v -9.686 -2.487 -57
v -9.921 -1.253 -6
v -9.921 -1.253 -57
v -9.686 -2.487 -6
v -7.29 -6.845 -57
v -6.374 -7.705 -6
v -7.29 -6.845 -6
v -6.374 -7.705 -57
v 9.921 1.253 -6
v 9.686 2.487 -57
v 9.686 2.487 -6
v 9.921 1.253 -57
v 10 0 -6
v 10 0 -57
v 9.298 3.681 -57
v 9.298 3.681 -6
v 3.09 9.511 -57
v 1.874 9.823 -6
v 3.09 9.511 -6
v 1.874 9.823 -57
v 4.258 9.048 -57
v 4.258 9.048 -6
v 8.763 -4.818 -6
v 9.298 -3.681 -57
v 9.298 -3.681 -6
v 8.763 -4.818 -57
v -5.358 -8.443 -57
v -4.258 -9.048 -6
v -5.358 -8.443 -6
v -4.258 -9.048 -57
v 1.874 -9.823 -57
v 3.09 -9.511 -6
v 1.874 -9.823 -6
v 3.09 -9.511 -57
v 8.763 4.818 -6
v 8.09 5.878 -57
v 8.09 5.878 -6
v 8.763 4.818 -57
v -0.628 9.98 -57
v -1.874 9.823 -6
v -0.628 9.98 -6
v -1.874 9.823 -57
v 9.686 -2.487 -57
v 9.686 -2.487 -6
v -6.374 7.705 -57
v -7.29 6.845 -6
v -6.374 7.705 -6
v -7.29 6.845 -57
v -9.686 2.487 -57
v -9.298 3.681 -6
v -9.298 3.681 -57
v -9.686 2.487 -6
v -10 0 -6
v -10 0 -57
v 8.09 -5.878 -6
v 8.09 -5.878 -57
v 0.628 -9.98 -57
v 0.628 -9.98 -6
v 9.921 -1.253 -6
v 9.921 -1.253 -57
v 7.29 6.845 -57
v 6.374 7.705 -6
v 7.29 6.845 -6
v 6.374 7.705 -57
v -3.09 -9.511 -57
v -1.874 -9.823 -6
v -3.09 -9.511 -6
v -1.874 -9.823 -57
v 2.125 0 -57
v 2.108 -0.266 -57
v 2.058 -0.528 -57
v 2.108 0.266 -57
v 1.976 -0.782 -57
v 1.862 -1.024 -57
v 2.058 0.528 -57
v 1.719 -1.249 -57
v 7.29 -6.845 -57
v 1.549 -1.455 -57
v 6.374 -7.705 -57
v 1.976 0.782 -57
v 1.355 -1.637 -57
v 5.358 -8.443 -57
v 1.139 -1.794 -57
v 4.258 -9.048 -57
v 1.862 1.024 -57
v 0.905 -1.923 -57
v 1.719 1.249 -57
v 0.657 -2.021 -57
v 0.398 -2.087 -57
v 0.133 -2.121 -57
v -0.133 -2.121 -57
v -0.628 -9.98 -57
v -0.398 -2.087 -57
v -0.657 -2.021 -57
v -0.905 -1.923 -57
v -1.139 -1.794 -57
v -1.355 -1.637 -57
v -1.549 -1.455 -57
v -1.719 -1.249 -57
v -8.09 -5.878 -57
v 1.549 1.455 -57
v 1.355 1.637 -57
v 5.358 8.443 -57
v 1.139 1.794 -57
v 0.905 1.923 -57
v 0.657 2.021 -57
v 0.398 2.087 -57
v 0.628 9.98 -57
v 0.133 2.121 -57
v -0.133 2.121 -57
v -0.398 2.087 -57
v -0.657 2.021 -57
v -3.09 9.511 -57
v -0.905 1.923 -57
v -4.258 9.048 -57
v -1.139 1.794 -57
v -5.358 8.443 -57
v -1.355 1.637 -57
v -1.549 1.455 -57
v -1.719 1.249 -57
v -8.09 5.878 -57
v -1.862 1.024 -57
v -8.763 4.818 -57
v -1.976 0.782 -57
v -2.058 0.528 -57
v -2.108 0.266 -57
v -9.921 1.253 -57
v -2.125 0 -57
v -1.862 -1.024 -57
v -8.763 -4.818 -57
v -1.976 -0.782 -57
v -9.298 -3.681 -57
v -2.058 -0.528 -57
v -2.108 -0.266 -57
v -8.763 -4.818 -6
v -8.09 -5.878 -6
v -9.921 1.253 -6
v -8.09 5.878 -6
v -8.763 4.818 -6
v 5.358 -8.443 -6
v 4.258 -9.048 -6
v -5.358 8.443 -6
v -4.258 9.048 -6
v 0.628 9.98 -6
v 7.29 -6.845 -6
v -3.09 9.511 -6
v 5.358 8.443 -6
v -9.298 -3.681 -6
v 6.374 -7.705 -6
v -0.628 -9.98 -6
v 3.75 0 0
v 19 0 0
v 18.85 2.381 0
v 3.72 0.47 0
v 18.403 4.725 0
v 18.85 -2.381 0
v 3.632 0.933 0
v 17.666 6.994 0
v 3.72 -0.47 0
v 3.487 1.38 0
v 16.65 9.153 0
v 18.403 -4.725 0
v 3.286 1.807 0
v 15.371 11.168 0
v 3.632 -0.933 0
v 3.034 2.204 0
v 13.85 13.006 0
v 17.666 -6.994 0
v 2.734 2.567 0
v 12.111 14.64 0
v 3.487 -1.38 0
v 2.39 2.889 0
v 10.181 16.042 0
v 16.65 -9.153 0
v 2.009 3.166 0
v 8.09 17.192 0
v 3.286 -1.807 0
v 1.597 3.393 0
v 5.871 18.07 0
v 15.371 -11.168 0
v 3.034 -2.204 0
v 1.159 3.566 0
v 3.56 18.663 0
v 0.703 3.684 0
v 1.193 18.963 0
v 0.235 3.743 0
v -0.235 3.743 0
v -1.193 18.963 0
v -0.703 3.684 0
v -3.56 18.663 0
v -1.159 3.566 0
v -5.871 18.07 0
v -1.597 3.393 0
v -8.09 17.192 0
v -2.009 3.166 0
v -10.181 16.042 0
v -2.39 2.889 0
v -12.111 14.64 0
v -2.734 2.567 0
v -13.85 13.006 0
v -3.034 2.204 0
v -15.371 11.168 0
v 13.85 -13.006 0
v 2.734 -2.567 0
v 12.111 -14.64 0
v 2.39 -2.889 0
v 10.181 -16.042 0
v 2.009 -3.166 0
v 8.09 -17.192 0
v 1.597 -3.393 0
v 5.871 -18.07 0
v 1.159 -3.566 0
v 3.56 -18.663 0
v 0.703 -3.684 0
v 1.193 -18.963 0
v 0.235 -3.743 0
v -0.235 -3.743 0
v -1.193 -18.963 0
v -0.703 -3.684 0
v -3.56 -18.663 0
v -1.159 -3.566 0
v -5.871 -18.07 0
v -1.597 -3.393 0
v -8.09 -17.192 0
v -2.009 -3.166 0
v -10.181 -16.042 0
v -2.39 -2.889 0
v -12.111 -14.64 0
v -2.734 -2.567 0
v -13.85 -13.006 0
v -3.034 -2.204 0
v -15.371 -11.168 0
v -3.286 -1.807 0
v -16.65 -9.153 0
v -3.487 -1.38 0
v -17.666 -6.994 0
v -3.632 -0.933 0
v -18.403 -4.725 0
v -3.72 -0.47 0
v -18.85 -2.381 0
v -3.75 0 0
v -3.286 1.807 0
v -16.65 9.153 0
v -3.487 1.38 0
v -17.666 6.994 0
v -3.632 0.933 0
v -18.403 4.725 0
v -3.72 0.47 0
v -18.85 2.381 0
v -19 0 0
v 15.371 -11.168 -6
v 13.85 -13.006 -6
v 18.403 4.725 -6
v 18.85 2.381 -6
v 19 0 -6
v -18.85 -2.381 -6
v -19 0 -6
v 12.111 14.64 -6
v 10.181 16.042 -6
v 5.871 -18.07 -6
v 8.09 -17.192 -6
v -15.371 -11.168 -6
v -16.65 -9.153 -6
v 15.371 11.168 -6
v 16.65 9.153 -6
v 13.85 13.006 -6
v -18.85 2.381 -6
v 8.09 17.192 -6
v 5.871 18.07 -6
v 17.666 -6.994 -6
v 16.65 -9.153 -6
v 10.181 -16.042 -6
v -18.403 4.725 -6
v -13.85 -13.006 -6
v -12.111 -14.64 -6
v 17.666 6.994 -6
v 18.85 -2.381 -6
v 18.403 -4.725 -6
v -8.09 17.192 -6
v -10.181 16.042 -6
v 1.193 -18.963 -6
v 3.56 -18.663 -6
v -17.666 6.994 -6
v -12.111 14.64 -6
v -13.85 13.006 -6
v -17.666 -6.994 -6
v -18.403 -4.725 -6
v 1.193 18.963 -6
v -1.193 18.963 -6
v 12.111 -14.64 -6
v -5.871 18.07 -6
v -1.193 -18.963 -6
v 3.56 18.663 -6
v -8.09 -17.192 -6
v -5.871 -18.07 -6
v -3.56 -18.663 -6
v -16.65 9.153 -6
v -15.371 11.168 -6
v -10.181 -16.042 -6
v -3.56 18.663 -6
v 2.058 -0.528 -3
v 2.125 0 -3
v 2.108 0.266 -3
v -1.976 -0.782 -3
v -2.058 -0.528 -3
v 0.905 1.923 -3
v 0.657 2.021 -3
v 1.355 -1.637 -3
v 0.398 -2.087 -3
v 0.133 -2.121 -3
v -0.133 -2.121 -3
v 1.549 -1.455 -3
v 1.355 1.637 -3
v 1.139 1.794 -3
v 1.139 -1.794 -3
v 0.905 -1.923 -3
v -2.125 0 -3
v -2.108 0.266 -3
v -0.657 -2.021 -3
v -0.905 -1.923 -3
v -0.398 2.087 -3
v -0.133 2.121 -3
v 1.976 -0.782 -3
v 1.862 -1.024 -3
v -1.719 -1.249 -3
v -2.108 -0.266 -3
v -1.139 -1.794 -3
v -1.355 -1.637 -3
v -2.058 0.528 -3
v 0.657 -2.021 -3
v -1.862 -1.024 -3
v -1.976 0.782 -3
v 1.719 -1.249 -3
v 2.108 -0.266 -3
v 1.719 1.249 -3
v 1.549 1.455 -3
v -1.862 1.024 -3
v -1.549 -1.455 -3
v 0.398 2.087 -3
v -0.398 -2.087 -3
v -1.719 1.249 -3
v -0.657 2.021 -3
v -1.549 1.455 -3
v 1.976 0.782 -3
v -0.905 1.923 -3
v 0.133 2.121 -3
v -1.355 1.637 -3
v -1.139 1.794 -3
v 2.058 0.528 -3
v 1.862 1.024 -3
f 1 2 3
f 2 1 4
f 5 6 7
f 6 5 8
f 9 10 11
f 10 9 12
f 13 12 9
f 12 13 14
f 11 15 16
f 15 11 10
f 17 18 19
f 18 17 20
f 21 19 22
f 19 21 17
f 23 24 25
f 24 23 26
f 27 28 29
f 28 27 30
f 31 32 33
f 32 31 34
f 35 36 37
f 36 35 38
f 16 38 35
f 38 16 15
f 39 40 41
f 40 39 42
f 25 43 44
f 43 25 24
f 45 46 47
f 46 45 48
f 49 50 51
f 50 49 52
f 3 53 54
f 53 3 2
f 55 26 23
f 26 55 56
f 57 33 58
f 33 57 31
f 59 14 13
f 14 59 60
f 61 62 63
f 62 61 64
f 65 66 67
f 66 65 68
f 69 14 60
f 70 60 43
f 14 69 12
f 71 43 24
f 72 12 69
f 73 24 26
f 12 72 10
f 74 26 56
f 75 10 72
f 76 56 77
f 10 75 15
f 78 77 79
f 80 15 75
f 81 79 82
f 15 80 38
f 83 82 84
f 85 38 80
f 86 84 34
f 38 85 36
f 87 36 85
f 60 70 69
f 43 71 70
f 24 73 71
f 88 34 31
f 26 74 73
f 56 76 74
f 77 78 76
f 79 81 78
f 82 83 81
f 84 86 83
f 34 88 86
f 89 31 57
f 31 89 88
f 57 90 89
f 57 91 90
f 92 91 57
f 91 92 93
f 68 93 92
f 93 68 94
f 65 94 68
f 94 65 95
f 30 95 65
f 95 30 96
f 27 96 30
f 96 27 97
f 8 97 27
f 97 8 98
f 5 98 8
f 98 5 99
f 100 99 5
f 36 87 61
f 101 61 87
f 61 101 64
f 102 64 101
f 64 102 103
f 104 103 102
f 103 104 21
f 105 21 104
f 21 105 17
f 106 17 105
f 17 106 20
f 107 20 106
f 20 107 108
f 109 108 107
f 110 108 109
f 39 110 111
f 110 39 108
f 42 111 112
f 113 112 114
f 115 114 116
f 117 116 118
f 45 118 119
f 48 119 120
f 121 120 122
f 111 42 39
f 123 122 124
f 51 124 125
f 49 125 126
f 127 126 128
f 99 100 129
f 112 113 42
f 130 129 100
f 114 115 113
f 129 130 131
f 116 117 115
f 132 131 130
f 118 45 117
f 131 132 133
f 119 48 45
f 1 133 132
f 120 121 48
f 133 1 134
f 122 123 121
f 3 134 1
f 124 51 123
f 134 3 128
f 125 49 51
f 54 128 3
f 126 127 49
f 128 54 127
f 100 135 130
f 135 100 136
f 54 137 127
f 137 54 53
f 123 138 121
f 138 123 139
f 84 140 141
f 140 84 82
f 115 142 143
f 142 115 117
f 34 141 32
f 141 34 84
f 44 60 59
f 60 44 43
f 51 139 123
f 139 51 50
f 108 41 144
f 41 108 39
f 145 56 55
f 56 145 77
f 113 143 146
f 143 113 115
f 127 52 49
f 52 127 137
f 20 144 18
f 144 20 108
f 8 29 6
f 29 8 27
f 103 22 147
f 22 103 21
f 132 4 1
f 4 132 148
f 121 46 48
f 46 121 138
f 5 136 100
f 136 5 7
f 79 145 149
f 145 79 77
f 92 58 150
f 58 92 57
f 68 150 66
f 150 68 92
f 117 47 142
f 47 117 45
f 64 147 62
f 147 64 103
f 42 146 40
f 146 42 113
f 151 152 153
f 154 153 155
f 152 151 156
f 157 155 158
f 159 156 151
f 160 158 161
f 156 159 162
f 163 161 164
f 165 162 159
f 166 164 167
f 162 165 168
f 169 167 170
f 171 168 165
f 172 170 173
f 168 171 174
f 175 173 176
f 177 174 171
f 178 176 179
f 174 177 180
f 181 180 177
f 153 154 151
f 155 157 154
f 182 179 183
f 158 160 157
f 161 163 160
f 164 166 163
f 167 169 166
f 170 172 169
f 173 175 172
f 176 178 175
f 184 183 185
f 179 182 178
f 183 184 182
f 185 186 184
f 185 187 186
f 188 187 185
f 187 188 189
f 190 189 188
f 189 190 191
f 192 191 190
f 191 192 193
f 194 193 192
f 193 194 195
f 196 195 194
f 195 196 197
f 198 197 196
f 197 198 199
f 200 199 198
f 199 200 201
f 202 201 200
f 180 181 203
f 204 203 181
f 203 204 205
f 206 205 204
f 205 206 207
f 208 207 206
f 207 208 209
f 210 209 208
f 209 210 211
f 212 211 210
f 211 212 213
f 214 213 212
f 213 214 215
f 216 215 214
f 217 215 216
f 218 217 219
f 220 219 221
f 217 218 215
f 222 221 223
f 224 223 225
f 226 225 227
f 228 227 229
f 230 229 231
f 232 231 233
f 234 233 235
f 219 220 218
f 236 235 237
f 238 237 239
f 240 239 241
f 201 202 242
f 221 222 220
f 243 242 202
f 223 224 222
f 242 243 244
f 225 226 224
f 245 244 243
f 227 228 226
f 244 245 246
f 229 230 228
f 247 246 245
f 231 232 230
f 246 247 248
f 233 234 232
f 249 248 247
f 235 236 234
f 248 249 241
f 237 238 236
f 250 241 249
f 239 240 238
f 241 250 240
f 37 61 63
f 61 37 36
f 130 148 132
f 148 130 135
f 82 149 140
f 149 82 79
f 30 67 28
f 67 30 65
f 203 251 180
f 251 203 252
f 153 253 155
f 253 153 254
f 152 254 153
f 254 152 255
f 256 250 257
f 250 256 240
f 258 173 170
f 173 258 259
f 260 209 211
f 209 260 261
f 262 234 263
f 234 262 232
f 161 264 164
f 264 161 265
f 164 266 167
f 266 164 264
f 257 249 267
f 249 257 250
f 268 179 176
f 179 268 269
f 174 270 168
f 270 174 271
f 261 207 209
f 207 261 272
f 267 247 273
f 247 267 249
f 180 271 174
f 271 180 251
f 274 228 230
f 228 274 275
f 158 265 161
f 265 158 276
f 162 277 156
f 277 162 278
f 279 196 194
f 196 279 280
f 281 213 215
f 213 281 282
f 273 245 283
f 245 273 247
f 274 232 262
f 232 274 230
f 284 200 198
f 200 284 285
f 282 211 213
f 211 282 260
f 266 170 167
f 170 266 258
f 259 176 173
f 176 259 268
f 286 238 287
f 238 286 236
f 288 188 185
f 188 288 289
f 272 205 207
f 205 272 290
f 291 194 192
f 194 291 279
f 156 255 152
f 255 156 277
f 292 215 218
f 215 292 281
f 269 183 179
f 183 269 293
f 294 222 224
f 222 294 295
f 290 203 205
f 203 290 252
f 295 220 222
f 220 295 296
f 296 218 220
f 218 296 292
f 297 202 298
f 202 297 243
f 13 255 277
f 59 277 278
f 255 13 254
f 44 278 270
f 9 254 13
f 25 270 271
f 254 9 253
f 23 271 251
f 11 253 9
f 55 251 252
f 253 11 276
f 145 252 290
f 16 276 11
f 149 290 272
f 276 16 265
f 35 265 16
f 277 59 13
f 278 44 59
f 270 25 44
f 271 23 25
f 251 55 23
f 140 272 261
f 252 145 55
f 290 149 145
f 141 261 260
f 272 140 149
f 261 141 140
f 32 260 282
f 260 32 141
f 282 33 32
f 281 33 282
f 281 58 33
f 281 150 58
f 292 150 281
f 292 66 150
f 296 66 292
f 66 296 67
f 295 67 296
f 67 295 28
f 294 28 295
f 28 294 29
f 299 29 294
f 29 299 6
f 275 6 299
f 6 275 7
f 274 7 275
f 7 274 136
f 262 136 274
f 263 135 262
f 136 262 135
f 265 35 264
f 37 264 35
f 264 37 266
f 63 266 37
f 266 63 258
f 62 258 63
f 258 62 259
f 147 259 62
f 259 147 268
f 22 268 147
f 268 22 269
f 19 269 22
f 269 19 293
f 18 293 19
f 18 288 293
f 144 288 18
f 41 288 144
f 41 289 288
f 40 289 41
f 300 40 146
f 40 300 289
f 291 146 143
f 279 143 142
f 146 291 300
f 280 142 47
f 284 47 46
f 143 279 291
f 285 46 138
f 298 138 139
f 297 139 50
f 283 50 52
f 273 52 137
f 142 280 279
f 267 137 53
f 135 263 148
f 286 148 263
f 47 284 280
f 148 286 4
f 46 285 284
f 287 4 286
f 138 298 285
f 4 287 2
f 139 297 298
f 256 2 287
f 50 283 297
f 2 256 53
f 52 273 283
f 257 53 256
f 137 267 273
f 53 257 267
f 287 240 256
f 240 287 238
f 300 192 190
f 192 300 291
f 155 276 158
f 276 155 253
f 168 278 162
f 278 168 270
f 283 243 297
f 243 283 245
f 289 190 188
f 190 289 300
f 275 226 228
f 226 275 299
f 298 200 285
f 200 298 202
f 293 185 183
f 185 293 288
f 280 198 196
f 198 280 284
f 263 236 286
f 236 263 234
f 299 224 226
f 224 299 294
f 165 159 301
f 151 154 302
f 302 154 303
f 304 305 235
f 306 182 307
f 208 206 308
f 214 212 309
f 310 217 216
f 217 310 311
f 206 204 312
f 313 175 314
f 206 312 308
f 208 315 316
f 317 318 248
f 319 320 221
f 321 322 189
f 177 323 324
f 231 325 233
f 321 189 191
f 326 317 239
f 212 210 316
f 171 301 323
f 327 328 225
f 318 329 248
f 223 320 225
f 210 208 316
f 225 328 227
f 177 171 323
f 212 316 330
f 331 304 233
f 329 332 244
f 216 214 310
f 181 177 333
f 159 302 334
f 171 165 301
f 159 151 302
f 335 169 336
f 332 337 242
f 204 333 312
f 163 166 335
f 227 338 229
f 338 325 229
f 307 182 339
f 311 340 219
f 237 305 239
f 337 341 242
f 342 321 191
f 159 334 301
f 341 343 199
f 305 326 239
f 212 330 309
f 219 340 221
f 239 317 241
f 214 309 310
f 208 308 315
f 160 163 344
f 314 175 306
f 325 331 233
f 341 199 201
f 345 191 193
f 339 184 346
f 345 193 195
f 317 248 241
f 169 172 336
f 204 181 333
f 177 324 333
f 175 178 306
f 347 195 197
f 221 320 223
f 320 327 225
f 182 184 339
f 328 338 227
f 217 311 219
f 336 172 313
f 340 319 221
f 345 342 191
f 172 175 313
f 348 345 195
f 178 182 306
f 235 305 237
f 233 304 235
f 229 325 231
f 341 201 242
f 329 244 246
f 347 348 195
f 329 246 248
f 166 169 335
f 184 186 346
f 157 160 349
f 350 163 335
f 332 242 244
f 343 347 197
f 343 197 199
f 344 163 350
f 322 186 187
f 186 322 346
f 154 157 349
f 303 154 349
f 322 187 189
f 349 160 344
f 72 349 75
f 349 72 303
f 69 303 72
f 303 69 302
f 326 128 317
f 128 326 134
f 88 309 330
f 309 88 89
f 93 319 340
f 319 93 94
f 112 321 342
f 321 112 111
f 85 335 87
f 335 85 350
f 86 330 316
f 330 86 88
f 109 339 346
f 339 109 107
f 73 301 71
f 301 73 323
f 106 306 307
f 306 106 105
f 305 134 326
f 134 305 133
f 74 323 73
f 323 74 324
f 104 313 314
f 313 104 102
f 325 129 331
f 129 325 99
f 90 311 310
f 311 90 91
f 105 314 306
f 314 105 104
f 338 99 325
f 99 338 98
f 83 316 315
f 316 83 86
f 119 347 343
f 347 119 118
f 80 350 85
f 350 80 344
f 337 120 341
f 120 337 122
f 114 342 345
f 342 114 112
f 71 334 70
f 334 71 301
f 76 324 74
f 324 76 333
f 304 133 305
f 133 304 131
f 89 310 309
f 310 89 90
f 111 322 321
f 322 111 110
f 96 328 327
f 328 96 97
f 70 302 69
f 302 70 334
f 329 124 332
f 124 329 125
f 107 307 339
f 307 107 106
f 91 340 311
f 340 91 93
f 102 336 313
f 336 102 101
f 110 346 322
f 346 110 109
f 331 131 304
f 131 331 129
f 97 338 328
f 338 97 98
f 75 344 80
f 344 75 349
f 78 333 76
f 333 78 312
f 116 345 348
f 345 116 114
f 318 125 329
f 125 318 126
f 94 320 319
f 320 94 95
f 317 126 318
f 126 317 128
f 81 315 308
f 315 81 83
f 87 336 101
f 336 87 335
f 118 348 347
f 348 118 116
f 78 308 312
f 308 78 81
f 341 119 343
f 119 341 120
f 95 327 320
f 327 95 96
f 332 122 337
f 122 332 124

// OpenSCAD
$fn = 50;


difference() {
	union() {
		translate(v = [0, 0, -57.0000000000]) {
			cylinder(h = 57, r = 10.0000000000);
		}
		translate(v = [0, 0, -6.0000000000]) {
			cylinder(h = 6, r = 19.0000000000);
		}
	}
	union() {
		translate(v = [0, 0, 0]) {
			rotate(a = [0, 0, 0]) {
				difference() {
					union() {
						#translate(v = [0, 0, -57.0000000000]) {
							cylinder(h = 57, r = 2.0000000000);
						}
						#translate(v = [0, 0, -3]) {
							cylinder(h = 3, r = 10.0000000000, r1 = 2.1250000000, r2 = 3.7500000000);
						}
						#translate(v = [0, 0, -57.0000000000]) {
							cylinder(h = 57, r = 2.1250000000);
						}
						#translate(v = [0, 0, -57.0000000000]) {
							cylinder(h = 57, r = 2.0000000000);
						}
					}
					union();
				}
			}
		}
	}
}
